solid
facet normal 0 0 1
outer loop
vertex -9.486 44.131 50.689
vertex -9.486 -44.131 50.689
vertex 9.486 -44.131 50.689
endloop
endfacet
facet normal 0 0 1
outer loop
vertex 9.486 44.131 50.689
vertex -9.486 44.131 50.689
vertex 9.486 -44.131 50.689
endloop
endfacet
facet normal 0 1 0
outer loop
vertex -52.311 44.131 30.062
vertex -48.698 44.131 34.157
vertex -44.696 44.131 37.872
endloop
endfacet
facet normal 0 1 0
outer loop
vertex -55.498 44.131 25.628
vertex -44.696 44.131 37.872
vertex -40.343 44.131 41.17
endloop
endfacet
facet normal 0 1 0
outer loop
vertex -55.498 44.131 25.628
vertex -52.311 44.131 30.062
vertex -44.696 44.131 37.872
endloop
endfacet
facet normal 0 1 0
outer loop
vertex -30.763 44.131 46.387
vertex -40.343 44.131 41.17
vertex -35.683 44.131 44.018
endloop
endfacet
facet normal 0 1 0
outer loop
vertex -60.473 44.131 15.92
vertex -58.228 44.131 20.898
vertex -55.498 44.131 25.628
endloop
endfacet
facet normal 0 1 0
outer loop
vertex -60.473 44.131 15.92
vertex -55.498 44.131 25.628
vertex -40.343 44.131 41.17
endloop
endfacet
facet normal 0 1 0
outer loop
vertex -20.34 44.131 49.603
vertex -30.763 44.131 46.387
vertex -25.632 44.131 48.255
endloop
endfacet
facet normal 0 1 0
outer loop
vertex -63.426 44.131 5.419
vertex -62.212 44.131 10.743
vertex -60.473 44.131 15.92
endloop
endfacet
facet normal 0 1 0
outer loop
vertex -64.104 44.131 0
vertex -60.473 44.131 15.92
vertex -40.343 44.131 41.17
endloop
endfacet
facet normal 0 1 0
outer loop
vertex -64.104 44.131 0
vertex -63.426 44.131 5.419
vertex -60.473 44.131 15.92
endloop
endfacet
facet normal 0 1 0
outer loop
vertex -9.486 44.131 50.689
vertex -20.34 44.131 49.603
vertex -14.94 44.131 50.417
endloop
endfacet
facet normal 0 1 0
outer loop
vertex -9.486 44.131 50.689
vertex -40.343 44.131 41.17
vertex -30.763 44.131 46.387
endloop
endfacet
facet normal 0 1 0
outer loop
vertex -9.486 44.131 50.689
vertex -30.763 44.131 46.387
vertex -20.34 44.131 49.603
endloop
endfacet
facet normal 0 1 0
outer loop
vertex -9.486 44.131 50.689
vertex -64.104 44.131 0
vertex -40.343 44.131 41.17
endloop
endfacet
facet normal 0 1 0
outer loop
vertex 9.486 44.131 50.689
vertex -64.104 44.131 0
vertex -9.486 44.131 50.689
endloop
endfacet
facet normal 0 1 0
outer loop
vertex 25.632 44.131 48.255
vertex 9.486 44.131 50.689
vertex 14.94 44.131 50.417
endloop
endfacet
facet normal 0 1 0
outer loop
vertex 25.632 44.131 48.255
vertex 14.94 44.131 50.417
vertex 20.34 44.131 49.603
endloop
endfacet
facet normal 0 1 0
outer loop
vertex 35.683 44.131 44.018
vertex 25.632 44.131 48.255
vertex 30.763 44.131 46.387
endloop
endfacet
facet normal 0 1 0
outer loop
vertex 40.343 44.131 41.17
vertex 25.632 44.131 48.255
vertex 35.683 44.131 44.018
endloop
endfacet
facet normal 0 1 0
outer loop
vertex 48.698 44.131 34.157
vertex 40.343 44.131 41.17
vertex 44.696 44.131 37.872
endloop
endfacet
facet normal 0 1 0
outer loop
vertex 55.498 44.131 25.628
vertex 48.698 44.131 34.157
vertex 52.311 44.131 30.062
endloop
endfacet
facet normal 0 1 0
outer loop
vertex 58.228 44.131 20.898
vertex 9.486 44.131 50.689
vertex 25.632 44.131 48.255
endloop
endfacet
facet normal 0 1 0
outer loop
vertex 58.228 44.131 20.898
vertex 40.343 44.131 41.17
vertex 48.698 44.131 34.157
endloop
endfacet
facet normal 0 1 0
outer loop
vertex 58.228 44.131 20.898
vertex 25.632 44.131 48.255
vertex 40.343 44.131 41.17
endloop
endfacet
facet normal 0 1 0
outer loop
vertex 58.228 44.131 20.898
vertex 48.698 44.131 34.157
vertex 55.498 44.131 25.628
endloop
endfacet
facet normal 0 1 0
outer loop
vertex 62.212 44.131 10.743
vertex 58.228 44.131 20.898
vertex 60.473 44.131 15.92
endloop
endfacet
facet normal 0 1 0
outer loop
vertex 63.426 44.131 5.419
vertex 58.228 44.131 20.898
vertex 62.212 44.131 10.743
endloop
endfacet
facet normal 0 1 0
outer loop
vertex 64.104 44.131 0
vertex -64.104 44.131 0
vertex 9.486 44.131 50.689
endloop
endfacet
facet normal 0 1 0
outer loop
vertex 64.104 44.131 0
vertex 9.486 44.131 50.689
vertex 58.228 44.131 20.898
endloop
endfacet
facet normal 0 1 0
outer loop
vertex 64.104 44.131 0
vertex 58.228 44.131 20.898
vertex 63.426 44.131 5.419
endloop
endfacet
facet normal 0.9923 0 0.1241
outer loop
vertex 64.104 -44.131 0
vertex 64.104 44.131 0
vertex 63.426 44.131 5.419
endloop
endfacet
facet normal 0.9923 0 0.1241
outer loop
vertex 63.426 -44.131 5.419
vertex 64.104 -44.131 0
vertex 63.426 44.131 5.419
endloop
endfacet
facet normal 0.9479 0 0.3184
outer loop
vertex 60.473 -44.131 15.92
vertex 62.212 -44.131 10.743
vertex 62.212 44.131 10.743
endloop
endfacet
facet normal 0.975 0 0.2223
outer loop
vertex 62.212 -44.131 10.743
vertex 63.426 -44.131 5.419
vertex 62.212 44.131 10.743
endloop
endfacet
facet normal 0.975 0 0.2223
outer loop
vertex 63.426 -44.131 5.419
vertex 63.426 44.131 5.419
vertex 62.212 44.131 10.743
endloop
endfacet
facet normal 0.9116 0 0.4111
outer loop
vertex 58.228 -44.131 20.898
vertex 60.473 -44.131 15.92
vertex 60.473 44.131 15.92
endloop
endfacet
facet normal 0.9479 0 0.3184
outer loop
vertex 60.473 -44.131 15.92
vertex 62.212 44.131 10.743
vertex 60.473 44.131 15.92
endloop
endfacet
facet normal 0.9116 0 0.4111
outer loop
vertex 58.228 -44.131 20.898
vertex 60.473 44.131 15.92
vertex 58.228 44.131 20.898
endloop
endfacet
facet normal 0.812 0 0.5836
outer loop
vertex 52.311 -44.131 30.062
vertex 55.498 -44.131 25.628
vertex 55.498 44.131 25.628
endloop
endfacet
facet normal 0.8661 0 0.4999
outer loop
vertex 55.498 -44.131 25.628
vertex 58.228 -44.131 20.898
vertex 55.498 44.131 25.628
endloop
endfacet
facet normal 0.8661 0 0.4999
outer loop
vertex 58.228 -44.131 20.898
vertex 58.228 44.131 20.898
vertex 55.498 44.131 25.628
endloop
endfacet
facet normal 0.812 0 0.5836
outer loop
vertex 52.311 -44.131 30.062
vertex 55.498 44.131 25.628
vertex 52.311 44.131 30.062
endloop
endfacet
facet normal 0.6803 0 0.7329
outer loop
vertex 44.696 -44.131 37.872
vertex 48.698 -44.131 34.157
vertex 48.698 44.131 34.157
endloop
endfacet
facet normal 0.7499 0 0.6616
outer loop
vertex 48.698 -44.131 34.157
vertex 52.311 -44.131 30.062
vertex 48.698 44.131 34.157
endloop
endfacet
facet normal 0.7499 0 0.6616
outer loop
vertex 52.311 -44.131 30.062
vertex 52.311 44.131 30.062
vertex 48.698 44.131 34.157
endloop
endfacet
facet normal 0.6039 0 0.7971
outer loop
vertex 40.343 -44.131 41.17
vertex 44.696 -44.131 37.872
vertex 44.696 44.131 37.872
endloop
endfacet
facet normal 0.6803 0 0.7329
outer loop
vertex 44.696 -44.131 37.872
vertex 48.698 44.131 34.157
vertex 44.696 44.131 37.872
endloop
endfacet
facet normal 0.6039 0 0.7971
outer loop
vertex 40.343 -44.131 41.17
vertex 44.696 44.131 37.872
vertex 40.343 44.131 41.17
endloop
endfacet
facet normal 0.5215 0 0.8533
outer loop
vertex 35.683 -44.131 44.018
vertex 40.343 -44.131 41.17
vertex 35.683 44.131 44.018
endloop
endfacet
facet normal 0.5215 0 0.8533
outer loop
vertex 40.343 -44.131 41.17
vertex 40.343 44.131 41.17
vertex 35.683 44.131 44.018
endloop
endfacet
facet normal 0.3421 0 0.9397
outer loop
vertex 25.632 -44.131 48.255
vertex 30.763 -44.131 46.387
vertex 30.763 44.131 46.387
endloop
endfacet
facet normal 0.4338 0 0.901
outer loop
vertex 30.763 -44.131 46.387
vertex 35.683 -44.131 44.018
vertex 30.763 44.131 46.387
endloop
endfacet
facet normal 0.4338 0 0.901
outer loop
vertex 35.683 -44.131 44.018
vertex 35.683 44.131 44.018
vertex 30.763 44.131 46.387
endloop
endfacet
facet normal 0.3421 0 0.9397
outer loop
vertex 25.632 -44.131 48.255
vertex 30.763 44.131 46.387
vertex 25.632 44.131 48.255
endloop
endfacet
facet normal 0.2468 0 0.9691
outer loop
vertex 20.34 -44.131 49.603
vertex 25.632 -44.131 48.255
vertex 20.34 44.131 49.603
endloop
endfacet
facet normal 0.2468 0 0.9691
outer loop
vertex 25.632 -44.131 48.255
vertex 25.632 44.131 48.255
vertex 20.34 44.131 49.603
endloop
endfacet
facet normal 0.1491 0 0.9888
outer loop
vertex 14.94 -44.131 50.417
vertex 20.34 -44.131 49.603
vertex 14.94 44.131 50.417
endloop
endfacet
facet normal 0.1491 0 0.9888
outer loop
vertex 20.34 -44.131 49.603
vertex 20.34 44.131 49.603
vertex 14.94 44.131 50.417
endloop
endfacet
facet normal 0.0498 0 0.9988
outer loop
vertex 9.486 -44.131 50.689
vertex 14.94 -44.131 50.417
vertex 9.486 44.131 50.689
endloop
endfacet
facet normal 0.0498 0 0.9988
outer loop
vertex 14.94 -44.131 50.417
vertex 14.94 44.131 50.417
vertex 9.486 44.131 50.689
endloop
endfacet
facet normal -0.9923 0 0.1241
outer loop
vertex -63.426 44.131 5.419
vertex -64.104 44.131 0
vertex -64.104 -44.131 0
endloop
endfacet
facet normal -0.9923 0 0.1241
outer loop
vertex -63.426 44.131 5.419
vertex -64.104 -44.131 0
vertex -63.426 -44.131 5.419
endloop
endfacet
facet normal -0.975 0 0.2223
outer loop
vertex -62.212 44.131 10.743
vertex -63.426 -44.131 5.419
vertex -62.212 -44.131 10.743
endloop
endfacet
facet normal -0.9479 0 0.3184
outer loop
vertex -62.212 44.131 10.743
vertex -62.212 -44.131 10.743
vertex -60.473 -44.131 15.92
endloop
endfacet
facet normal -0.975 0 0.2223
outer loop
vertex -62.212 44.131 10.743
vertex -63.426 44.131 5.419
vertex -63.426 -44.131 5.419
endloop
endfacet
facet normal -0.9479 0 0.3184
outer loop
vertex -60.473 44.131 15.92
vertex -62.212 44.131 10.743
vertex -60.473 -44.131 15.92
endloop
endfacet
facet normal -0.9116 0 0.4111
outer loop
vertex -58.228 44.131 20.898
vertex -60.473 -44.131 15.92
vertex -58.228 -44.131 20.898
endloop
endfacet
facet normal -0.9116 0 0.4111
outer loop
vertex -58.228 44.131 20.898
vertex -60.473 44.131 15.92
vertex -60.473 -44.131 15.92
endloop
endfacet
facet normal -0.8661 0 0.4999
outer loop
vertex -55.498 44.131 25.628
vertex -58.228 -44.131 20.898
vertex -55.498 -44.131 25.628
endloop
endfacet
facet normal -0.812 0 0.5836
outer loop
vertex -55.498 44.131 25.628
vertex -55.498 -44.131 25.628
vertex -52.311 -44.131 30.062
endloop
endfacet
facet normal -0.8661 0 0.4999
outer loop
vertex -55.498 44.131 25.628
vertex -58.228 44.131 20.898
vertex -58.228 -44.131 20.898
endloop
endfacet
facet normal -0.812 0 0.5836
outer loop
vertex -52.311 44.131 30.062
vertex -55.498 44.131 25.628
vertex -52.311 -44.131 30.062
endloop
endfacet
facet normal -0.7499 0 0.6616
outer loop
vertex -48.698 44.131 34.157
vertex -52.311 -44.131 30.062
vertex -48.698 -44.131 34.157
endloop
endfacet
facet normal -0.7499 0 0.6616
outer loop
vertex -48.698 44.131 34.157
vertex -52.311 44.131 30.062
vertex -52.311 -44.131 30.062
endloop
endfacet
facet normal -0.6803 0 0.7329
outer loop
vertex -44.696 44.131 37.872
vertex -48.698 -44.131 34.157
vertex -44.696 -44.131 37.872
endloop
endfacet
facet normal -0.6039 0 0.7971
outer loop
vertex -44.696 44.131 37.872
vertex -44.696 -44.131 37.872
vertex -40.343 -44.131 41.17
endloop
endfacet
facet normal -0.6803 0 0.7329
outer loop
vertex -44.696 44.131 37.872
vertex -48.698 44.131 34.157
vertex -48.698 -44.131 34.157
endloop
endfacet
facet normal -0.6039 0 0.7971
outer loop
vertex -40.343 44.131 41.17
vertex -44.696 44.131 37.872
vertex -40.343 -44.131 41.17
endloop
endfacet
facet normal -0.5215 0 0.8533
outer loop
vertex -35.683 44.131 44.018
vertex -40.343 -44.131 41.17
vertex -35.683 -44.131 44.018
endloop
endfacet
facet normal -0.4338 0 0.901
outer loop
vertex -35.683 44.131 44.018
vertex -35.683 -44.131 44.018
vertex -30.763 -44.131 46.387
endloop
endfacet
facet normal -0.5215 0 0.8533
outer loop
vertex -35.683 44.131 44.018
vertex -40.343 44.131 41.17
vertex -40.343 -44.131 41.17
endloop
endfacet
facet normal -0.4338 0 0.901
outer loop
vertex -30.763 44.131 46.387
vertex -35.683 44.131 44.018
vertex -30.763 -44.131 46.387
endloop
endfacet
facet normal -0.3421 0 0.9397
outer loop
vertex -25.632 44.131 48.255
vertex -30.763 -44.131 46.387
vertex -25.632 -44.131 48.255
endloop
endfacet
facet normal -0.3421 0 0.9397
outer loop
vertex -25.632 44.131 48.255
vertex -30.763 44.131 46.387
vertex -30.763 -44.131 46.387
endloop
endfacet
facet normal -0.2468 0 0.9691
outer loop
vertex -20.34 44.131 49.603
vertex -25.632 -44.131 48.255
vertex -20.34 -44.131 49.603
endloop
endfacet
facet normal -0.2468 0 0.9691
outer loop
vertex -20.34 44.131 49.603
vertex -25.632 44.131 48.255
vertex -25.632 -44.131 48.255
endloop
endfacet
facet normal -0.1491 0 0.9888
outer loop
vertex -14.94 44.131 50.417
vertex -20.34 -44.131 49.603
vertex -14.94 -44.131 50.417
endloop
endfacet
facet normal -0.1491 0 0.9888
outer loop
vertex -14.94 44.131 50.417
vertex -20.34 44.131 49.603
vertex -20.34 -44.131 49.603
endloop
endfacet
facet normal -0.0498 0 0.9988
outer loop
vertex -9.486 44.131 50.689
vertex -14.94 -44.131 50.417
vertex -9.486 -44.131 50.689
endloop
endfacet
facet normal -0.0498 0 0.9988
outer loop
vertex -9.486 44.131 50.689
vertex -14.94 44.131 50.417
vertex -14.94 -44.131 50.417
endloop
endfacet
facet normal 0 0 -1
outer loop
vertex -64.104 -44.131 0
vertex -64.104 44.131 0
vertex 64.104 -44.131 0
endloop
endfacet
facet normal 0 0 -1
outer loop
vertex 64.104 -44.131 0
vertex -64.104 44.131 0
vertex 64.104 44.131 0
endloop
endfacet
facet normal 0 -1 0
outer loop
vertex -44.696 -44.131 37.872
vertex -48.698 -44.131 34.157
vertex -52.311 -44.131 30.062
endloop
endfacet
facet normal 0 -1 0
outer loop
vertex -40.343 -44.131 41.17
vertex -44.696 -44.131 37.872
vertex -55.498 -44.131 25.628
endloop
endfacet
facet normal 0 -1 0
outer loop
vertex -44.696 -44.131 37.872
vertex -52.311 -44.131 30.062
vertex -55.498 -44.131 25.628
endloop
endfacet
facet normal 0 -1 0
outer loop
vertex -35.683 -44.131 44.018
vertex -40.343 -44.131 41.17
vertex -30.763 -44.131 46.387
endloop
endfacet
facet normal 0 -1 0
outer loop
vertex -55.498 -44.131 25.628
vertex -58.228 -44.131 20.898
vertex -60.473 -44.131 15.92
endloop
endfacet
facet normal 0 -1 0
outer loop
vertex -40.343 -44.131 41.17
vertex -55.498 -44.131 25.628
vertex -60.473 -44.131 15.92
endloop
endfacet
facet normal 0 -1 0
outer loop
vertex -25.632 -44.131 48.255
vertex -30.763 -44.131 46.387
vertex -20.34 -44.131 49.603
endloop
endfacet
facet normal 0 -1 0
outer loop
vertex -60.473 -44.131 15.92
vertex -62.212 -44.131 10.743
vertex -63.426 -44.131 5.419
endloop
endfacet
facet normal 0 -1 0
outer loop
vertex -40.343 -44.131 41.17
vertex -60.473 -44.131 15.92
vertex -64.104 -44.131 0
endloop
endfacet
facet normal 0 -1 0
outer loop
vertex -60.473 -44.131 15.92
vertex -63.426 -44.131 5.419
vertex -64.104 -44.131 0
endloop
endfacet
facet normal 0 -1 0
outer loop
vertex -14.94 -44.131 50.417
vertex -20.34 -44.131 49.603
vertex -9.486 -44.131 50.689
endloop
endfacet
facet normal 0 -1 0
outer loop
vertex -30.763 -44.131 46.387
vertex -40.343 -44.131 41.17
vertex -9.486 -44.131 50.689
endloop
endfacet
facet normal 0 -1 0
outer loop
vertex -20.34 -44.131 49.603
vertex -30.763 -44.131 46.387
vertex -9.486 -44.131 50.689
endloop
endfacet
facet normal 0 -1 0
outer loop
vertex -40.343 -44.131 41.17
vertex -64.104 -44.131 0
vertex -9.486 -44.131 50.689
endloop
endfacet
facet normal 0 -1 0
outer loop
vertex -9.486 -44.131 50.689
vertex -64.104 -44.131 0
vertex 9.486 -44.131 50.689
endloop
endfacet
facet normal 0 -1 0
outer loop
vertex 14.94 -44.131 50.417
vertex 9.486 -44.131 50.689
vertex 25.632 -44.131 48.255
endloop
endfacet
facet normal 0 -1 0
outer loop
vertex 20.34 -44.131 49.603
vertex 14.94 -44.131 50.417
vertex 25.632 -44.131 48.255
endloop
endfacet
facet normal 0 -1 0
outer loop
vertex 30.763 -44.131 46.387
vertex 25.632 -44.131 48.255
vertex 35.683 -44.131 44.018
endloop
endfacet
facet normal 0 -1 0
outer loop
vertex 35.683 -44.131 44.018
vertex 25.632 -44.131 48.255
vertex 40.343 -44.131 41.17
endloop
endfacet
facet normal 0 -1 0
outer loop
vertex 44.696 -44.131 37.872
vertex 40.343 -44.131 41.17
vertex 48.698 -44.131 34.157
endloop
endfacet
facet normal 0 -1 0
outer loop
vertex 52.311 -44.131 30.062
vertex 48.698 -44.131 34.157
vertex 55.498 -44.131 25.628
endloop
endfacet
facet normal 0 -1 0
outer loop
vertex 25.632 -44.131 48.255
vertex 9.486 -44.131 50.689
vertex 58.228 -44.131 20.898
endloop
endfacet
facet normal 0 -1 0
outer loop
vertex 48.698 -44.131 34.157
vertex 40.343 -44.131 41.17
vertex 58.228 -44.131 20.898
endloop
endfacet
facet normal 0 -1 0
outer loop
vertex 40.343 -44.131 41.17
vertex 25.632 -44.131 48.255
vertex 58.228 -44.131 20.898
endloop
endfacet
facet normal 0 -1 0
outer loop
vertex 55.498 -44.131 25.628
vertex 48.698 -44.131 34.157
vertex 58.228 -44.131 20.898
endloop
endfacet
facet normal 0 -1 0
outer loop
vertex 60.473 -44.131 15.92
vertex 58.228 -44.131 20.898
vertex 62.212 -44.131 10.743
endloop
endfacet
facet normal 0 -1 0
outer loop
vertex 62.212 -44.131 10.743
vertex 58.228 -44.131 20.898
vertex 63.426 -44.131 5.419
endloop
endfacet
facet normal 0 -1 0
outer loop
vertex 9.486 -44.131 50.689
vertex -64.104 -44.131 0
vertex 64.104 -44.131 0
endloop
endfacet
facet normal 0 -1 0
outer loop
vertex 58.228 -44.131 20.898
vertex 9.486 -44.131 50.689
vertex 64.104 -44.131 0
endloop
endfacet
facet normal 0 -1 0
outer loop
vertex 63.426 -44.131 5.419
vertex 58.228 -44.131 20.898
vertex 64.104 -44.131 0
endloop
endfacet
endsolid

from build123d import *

# Parameters (mm, degrees)
F0_W        = 128.2073557377
F0_H        = 88.262155652
F1_DEPTH    = 50.68946
F2_T1_DEPTH = 361.3524449255
F3_T1_DEPTH = 361.352454187


# Not quite as in the source:
# - a fillet or chamfer that OpenCascade refuses, or shapes differently, is made with other operations: its cross-section is extruded or revolved along the edge and cut away or added


with BuildPart() as f1:
    # F0 (on Top) → F1 (new body)
    with BuildSketch(Plane.XY):
        Rectangle(F0_W, F0_H)
    extrude(amount=F1_DEPTH)

    # F2: fillet of radius 54.7702974041 on 1 edges, made by hand

    # F2_s2 → F2_t1 (cut)
    with BuildSketch(Plane.XZ.offset(-180.6762224627)):
        with BuildLine():
            ThreePointArc((-64.1036778688, 0), (-46.7433494099, 36.0644870809), (-9.4856200142, 50.68946))
            Line((-9.4856200142, 50.68946), (-64.1036778688, 50.68946))
            Line((-64.1036778688, 50.68946), (-64.1036778688, 0))
        make_face()
    extrude(amount=F2_T1_DEPTH, mode=Mode.SUBTRACT)

    # F3: fillet of radius 54.7702994 on 1 edges, made by hand

    # F3_s2 → F3_t1 (cut)
    with BuildSketch(Plane.XZ.offset(-180.6762270935)):
        with BuildLine():
            ThreePointArc((64.1036778688, 0), (46.7433482365, 36.064487178), (9.4856181618, 50.68946))
            Line((9.4856181618, 50.68946), (64.1036778688, 50.68946))
            Line((64.1036778688, 50.68946), (64.1036778688, 0))
        make_face()
    extrude(amount=F3_T1_DEPTH, mode=Mode.SUBTRACT)


solid = f1.part
